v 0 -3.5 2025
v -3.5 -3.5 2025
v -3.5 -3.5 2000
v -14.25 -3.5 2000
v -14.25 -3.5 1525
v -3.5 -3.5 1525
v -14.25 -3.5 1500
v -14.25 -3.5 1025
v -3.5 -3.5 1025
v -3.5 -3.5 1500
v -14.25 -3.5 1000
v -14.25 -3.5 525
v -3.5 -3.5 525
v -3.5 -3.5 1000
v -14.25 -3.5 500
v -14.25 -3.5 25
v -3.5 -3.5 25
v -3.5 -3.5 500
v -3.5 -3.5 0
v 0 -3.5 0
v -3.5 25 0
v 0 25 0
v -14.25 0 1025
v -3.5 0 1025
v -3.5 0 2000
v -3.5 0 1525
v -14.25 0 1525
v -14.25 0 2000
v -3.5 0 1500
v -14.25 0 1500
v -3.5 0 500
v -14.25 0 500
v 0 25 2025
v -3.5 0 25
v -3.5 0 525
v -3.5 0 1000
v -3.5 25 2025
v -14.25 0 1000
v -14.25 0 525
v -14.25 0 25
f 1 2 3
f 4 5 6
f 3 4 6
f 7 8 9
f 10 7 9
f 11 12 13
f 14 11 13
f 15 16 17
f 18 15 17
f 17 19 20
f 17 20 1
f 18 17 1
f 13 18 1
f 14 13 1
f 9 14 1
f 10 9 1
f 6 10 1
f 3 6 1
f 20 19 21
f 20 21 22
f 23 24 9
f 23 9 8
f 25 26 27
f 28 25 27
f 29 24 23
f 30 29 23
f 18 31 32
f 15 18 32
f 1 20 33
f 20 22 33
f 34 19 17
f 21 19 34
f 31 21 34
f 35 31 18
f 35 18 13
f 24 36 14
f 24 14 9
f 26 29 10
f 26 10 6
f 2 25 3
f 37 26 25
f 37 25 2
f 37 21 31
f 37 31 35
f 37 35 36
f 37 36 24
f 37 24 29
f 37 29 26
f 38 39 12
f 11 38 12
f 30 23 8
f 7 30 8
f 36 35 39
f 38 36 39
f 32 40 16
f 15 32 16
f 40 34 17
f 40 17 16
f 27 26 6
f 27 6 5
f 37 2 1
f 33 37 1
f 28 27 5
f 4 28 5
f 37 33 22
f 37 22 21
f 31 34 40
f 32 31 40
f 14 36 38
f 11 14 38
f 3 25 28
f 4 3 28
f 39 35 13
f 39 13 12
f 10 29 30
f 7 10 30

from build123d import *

# Parameters (mm, degrees)
F1_DEPTH = 2025
F2_W     = 10.75
F2_H     = 25
F3_DEPTH = 3.501
F4_W     = 10.75
F4_H     = 3.5
F5_DEPTH = 2000.001


with BuildPart() as f1:
    # F0 (on Top) → F1 (new body)
    with BuildSketch(Plane.XY):
        Polygon((-14.25, 0), (-14.25, -3.5), (10.75, -3.5), (10.75, 0), (0, 0), (0, 25), (-3.5, 25), (-3.5, 0), align=None)
    extrude(amount=F1_DEPTH)

    # F2 (on face) → F3 (cut, through all)
    with BuildSketch(Plane(origin=(0, 0, 0), x_dir=(-1, 0, 0), z_dir=(0, 1, 0))):
        with Locations((8.875, 12.5)):
            Rectangle(F2_W, F2_H)
        Polygon((-10.75, 2012.5), (-10.75, 2000), (0, 2000), (0, 2025), (-10.75, 2025), align=None)
        Polygon((-10.75, 1512.5), (-10.75, 1500), (0, 1500), (0, 1525), (-10.75, 1525), align=None)
        Polygon((-10.75, 1012.5), (-10.75, 1000), (0, 1000), (0, 1025), (-10.75, 1025), align=None)
        Polygon((-10.75, 512.5), (-10.75, 500), (0, 500), (0, 525), (-10.75, 525), align=None)
        Polygon((-10.75, 0), (0, 0), (0, 25), (-10.75, 25), (-10.75, 12.5), align=None)
        with Locations((8.875, 2012.5)):
            Rectangle(F2_W, F2_H)
        with Locations((8.875, 1512.5)):
            Rectangle(F2_W, F2_H)
        with Locations((8.875, 1012.5)):
            Rectangle(F2_W, F2_H)
        with Locations((8.875, 512.5)):
            Rectangle(F2_W, F2_H)
    extrude(amount=-F3_DEPTH, mode=Mode.SUBTRACT)

    # F4 (on face) → F5 (cut, through all)
    with BuildSketch(Plane.XY.offset(2000)):
        with Locations((5.375, -1.75)):
            Rectangle(F4_W, F4_H)
    extrude(amount=-F5_DEPTH, mode=Mode.SUBTRACT)


solid = f1.part
